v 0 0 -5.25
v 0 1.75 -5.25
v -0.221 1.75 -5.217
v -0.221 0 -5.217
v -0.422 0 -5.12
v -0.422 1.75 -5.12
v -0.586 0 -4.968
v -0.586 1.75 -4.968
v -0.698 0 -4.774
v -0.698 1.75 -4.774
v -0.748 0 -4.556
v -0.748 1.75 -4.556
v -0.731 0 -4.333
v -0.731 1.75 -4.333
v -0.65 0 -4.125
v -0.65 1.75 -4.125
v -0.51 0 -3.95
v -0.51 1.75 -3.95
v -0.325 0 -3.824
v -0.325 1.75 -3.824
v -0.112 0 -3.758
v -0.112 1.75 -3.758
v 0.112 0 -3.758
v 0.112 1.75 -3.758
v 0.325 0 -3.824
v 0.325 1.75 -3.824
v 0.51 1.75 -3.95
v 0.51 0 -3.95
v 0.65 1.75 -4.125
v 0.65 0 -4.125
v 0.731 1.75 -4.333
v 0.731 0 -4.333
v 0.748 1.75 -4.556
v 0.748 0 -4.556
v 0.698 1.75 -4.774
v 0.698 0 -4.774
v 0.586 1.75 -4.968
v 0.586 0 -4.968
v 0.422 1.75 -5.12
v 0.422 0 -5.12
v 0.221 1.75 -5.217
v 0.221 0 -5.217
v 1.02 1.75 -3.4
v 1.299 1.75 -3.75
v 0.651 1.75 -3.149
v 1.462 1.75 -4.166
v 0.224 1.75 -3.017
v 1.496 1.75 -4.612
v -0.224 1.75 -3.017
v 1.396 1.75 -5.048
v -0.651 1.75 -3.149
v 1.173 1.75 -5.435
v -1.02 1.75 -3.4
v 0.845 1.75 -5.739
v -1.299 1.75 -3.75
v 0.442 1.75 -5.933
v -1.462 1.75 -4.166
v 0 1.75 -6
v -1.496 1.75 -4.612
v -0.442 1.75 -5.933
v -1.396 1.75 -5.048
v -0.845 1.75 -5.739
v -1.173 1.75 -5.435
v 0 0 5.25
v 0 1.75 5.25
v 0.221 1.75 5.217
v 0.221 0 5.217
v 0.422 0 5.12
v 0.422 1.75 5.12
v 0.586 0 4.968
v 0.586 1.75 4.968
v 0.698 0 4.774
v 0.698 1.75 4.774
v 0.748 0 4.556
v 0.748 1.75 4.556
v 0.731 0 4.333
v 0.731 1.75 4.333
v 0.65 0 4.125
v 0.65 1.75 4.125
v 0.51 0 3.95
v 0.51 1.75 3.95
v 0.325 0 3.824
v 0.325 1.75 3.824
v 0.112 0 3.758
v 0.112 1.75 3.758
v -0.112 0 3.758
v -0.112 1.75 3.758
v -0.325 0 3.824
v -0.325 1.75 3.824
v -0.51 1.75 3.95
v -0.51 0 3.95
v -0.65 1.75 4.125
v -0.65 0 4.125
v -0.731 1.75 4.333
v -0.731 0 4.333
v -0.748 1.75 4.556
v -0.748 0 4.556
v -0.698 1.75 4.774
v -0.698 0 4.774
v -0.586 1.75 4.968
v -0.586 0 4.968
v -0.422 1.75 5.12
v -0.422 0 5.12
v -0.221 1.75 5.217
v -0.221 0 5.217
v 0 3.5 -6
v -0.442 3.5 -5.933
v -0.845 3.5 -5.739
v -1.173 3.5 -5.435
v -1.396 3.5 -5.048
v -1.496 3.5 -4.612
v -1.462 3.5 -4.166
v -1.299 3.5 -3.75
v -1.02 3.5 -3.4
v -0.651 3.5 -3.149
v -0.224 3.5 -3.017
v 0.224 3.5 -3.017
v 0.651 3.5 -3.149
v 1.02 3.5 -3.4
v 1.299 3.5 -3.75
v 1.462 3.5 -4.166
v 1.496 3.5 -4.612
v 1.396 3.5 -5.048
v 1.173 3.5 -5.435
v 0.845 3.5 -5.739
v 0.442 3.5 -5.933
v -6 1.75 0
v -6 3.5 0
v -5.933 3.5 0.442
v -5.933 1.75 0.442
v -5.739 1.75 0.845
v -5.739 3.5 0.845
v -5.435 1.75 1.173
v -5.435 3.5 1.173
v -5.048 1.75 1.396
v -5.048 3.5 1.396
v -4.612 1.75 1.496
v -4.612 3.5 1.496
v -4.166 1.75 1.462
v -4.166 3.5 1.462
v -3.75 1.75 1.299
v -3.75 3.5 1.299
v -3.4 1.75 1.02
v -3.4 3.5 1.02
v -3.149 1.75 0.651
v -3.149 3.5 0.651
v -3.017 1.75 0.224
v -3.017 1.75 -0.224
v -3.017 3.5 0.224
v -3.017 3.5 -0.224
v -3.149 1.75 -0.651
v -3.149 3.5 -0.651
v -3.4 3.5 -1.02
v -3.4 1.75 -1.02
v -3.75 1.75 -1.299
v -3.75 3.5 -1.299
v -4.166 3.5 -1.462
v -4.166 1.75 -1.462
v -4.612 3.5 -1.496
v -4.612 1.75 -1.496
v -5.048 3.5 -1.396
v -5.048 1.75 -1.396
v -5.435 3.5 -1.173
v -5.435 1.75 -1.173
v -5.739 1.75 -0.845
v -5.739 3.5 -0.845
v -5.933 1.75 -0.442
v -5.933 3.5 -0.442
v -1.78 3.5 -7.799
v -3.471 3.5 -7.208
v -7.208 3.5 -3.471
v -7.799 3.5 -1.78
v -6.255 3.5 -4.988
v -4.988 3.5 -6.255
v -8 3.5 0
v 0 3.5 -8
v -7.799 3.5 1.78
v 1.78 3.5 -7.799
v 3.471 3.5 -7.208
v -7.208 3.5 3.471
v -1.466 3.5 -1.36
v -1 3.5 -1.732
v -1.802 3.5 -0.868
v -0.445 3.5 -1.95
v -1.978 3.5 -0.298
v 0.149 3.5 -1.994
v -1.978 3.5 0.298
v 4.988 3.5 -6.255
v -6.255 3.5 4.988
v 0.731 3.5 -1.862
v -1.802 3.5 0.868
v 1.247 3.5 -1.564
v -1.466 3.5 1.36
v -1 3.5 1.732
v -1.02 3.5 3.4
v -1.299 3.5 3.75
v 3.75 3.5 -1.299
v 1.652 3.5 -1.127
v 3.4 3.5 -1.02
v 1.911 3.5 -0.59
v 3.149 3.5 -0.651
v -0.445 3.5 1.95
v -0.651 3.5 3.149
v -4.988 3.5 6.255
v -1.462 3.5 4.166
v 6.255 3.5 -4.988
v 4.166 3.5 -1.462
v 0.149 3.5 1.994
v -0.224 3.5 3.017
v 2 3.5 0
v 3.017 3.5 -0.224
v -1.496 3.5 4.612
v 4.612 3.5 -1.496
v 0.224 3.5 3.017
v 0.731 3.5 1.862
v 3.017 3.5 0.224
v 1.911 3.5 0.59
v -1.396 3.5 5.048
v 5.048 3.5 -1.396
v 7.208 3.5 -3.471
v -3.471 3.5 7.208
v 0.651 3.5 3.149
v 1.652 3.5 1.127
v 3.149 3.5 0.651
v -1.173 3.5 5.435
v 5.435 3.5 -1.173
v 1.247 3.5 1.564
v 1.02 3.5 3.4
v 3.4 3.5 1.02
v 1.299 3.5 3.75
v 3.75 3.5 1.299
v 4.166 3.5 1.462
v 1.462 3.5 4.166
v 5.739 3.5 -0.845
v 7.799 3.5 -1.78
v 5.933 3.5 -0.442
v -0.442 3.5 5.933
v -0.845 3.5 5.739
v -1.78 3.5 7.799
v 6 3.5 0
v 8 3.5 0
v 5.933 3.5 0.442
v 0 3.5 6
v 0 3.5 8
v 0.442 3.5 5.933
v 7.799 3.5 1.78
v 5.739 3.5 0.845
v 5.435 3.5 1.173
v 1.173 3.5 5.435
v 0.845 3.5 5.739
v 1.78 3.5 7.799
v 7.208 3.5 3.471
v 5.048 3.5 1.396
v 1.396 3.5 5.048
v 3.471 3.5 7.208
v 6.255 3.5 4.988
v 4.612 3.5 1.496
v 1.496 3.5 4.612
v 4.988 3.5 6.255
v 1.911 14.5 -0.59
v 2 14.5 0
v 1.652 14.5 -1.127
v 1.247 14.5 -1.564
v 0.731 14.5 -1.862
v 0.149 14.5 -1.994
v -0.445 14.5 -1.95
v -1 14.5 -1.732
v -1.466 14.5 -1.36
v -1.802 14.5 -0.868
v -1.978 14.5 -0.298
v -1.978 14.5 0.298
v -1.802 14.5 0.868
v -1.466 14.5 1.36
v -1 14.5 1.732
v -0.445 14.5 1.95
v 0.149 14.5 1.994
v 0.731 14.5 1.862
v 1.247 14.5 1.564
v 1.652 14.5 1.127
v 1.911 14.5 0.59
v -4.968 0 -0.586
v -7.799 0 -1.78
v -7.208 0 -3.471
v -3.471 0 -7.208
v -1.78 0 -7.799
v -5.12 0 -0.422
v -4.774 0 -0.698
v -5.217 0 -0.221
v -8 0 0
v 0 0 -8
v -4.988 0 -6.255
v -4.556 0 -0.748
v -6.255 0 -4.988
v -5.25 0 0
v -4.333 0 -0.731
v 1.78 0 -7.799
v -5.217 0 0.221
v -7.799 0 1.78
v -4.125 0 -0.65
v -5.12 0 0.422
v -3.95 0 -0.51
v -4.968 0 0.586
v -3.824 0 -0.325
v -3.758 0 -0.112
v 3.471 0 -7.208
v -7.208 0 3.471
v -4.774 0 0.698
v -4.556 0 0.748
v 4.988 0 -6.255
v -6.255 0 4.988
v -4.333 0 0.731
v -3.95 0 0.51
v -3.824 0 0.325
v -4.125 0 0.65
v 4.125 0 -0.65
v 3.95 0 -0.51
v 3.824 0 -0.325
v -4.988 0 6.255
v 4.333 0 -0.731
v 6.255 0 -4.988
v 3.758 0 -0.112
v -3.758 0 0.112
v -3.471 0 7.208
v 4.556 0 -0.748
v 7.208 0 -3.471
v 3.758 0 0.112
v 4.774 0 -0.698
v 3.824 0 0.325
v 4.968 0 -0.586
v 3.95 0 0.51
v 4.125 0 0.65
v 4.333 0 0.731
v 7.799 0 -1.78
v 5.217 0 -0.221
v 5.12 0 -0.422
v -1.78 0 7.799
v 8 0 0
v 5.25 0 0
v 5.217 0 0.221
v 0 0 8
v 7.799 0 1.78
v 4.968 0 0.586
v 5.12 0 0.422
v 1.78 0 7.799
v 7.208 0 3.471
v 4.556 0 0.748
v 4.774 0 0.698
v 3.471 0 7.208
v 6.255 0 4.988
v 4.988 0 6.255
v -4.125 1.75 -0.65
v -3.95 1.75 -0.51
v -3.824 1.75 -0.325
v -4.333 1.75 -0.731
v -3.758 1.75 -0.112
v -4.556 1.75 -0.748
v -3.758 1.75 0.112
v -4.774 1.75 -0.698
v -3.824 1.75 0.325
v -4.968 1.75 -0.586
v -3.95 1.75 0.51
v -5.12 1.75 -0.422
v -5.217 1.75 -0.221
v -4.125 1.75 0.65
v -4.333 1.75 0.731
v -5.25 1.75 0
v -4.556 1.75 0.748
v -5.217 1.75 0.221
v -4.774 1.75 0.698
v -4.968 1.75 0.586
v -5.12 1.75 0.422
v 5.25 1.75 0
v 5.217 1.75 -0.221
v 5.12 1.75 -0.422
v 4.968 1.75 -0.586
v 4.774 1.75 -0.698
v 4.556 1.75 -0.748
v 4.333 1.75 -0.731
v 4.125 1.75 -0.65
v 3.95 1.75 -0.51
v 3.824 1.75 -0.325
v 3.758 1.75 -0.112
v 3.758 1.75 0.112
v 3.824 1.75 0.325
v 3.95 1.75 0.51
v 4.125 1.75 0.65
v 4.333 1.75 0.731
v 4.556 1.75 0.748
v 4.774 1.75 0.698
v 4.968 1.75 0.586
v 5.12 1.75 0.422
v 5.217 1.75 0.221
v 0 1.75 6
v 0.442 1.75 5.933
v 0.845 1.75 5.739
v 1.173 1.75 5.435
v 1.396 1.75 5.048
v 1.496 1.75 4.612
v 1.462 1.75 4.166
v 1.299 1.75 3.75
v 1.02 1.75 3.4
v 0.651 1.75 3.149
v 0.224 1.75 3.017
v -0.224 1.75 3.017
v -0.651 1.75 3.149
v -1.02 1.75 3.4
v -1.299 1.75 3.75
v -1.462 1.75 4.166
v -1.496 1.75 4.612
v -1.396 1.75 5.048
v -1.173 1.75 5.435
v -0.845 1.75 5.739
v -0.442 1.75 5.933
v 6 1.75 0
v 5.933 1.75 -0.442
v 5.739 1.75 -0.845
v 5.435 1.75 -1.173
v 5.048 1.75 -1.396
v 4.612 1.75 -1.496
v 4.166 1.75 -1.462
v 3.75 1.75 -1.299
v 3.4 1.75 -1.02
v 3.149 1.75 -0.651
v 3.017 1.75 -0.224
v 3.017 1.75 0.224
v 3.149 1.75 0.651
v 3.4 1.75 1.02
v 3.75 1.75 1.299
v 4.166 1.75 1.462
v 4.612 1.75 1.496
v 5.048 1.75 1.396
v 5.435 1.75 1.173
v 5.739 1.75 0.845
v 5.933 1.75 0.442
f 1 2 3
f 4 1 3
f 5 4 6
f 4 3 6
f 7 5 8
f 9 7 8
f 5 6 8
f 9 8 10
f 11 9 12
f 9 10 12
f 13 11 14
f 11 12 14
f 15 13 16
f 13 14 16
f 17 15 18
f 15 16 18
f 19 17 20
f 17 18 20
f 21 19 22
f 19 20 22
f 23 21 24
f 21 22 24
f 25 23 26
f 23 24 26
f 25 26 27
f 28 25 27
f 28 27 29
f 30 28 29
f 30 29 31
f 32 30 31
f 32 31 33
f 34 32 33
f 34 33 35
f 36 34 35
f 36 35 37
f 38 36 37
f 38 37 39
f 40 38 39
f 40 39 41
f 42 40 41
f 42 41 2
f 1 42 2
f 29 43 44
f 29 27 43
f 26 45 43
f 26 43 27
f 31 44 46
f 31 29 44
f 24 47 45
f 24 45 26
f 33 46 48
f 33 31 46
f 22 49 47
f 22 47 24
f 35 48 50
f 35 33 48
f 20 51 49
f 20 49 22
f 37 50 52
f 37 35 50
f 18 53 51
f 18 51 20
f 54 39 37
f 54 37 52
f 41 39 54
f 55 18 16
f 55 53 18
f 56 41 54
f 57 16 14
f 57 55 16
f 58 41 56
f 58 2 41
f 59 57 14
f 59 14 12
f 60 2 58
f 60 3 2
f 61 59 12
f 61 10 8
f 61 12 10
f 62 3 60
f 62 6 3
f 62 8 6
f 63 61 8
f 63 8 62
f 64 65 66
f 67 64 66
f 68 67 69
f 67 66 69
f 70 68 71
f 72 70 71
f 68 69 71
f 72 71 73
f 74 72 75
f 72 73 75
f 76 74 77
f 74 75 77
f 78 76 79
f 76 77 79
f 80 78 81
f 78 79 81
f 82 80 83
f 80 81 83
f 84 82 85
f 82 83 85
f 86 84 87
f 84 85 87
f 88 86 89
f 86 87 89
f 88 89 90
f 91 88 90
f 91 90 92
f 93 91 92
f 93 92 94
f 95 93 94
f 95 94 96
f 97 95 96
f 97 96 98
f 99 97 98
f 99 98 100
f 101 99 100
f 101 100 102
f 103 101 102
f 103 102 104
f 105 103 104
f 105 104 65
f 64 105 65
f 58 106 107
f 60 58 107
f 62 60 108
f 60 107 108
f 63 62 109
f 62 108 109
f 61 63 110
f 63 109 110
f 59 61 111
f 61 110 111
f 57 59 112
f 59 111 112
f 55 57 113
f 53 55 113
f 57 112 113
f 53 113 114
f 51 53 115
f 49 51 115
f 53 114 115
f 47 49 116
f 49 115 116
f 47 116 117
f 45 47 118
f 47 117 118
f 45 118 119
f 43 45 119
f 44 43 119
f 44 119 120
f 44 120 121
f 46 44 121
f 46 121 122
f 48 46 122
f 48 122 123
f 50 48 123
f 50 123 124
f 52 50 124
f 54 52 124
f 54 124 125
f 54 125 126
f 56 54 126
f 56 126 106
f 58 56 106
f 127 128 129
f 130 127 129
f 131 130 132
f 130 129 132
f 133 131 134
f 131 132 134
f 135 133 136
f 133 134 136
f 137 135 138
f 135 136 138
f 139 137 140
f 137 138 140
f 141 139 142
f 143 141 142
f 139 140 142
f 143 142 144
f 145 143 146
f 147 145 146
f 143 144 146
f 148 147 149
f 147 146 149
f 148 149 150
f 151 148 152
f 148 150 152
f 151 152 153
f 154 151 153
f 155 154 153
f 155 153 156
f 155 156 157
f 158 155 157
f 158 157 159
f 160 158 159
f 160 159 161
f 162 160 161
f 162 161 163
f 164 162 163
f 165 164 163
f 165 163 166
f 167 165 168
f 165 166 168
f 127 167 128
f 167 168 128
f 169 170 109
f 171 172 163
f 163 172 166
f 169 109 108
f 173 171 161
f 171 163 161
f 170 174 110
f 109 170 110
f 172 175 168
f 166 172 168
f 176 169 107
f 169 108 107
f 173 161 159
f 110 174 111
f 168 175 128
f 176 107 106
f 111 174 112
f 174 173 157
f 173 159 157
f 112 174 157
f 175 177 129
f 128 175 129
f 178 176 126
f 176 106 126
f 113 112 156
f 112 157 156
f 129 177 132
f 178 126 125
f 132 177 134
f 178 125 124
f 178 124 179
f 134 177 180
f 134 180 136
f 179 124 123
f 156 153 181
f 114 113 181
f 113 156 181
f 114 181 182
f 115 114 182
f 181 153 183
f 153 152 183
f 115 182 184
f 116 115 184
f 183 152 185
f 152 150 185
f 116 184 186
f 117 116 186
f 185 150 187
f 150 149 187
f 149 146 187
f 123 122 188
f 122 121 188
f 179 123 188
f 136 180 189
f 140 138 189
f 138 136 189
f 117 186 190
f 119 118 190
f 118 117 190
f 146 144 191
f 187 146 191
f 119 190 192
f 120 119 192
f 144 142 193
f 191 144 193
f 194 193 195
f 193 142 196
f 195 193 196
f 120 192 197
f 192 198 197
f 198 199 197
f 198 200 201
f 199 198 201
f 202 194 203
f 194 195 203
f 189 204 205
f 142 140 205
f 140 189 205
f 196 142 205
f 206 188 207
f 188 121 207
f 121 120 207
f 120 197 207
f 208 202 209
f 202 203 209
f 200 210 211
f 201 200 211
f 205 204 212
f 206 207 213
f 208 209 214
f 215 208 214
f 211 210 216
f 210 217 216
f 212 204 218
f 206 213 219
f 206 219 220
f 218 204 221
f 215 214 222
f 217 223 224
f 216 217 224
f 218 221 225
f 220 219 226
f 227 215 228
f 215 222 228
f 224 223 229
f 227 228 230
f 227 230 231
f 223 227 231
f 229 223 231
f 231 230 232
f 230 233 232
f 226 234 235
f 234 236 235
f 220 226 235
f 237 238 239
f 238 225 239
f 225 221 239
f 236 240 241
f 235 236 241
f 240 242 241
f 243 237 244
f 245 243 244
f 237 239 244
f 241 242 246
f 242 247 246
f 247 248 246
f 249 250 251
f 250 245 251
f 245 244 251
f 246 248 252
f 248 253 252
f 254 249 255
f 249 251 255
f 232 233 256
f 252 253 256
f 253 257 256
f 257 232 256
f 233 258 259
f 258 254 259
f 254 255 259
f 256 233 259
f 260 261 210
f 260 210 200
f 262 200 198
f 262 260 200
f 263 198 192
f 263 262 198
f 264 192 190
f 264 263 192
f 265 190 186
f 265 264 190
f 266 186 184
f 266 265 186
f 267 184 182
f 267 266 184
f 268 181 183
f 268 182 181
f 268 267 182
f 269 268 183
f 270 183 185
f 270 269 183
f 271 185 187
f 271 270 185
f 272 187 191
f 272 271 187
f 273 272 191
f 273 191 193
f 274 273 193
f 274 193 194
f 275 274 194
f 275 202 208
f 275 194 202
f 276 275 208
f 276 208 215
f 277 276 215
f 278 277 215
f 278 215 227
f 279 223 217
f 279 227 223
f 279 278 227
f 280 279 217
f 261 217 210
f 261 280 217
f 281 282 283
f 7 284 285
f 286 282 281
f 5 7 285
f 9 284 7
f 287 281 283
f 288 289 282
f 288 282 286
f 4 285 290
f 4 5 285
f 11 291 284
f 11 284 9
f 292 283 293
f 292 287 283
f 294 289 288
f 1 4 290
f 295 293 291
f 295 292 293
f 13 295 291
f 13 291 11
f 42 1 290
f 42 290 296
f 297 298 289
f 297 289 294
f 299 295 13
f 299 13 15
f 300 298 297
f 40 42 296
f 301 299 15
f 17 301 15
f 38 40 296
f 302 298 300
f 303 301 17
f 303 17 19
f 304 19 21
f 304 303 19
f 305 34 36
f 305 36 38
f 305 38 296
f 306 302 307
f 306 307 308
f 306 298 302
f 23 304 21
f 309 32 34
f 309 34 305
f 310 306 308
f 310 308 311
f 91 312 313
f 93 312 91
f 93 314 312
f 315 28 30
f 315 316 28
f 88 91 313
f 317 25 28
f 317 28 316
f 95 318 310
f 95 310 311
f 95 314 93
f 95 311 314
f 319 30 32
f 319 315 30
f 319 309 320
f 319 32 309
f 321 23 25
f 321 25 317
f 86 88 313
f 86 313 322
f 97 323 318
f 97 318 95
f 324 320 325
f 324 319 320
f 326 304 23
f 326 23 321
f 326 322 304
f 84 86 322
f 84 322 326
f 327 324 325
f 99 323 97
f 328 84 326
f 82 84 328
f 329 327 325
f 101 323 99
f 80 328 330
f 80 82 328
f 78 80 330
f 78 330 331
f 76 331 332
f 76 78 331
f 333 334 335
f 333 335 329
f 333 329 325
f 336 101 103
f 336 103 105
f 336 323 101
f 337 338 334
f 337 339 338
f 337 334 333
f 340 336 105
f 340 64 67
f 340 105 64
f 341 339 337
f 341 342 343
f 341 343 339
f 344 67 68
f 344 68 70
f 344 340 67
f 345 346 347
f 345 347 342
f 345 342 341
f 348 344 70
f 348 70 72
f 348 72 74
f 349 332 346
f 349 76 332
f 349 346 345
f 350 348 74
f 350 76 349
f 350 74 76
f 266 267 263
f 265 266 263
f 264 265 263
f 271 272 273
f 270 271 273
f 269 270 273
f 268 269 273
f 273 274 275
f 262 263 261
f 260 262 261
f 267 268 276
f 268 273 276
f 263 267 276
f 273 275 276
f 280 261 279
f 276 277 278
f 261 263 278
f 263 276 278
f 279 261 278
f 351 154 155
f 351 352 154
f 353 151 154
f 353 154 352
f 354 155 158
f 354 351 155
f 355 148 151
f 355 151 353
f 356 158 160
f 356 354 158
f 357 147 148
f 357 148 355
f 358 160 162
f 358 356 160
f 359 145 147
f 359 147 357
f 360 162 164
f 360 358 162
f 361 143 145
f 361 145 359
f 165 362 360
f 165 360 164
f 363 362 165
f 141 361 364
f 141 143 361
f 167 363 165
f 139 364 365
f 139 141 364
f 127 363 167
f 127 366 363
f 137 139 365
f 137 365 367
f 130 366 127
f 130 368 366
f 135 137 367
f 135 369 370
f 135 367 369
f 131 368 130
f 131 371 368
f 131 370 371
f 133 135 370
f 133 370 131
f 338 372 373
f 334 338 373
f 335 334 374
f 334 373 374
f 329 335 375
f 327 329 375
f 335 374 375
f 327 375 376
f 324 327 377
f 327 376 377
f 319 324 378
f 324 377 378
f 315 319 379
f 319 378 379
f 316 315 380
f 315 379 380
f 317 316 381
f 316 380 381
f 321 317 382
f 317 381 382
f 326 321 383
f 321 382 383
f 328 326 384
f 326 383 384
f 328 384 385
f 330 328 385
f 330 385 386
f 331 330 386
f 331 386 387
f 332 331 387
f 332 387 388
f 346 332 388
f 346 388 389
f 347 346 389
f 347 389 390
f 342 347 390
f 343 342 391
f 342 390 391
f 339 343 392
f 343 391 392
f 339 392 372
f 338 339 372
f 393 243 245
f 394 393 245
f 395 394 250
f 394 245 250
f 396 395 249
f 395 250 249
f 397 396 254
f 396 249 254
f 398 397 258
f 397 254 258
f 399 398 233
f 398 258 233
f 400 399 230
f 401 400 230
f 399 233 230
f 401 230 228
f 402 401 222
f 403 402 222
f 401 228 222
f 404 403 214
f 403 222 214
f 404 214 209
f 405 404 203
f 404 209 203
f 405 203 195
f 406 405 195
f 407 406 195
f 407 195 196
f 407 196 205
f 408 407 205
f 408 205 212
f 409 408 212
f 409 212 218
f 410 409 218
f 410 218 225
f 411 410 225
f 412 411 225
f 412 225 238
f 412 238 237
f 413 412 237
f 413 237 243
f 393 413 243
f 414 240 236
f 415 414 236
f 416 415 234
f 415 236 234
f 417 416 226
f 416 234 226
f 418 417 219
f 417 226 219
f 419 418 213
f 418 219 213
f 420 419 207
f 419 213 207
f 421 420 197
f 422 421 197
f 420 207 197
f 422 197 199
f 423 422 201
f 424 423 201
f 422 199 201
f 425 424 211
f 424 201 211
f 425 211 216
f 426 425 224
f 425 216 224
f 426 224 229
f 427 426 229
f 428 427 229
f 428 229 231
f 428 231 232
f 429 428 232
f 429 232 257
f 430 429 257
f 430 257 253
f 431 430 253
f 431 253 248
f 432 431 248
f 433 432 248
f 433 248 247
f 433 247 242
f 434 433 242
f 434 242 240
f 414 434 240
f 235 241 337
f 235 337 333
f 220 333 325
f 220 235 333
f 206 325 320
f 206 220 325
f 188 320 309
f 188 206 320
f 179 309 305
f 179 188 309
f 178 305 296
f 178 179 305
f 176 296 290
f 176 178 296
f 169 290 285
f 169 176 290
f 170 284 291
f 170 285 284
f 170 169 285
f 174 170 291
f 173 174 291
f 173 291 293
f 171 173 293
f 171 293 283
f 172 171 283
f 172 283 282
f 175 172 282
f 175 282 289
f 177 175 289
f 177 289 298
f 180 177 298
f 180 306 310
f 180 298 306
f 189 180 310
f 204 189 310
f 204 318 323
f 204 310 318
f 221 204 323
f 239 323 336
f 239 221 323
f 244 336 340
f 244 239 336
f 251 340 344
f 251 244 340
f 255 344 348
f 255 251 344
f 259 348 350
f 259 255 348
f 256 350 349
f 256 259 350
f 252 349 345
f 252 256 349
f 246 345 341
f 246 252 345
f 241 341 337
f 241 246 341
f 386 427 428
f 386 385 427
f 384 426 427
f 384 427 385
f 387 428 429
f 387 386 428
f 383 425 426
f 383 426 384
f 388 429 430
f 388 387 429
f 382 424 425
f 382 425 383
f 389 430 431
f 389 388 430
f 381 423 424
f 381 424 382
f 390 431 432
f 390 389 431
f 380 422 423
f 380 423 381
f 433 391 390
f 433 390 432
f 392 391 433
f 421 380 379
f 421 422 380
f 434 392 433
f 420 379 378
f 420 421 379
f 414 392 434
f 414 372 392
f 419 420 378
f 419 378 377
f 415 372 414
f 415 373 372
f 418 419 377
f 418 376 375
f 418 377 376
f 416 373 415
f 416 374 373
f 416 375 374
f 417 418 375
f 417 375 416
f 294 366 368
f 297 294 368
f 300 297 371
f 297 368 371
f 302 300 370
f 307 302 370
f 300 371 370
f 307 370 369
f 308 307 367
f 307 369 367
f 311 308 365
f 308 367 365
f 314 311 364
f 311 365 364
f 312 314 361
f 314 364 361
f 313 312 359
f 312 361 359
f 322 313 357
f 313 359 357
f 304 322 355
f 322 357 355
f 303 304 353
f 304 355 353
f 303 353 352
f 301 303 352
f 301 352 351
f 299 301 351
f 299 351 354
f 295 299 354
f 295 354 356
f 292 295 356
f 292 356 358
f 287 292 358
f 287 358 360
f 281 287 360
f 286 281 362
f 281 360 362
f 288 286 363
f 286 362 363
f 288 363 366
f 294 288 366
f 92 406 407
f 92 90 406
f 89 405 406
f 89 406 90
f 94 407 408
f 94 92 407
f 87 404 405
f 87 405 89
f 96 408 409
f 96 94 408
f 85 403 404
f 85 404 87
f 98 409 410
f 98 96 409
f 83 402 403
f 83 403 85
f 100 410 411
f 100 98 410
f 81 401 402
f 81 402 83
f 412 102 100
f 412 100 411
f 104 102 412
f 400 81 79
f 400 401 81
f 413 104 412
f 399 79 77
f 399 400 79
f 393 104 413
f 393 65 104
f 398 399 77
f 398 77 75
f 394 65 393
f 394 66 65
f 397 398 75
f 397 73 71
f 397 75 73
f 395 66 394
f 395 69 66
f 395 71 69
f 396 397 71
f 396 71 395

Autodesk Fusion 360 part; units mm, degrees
sketch "Sketch1" plane through (0, 0, 0) normal (0, 0, 1) x (1, 0, 0)
  line L0 (0, 0) -> (8, 0)
  line L1 (8, 0) -> (8, 3.5)
  line L2 (8, 3.5) -> (2, 3.5)
  line L3 (2, 3.5) -> (2, 14.5)
  line L4 (2, 14.5) -> (0, 14.5)
  line L5 (0, 14.5) -> (0, 0)
revolve "Revolve1" add sketch "Sketch1" angle 360 about axis through (0, 14.5, 0) along (0, -1, 0)
sketch "Sketch2" plane through (0, 3.5, 0) normal (0, 1, 0) x (-1, 0, 0)
  circle A0 centre (0, 0) radius 2
  circle A1 centre (0, 0) radius 8
  circle A2 centre (0, 0) radius 4.5
  line L0 (0, 0) -> (1, 0) construction
  line L1 (1, 0) -> (8, 0) construction
  line L2 (0, 0) -> (0, -0.385) construction
  line L3 (0, -0.385) -> (0, -8) construction
  line L4 (0, 0) -> (-8, 0) construction
  line L5 (0, 0) -> (0, 8) construction
  circle A3 centre (4.5, 0) radius 1.5
extrude "Extrude1" cut sketch "Sketch2" against normal blind 1.75 contours A2 A3 | A2 A3 picked at (4.0029, -0.277) picked at (4.9442, -0.3776)
sketch "Sketch3" plane through (0, 1.75, 0) normal (0, 1, 0) x (-1, 0, 0)
  circle A0 centre (4.5, 0) radius 1.5
  circle A1 centre (4.5, 0) radius 0.75
  dimension "d10" = 1.5
extrude "Extrude2" cut sketch "Sketch3" against normal blind 5 contours A1
pattern_circular "C-Pattern1" count 4 over 360 about axis through (0, 1.75, 0) along (0, 1, 0) of "Extrude1"
pattern_circular "C-Pattern2" count 4 over 360 about axis through (0, 1.75, 0) along (0, 1, 0) of "Extrude2"
